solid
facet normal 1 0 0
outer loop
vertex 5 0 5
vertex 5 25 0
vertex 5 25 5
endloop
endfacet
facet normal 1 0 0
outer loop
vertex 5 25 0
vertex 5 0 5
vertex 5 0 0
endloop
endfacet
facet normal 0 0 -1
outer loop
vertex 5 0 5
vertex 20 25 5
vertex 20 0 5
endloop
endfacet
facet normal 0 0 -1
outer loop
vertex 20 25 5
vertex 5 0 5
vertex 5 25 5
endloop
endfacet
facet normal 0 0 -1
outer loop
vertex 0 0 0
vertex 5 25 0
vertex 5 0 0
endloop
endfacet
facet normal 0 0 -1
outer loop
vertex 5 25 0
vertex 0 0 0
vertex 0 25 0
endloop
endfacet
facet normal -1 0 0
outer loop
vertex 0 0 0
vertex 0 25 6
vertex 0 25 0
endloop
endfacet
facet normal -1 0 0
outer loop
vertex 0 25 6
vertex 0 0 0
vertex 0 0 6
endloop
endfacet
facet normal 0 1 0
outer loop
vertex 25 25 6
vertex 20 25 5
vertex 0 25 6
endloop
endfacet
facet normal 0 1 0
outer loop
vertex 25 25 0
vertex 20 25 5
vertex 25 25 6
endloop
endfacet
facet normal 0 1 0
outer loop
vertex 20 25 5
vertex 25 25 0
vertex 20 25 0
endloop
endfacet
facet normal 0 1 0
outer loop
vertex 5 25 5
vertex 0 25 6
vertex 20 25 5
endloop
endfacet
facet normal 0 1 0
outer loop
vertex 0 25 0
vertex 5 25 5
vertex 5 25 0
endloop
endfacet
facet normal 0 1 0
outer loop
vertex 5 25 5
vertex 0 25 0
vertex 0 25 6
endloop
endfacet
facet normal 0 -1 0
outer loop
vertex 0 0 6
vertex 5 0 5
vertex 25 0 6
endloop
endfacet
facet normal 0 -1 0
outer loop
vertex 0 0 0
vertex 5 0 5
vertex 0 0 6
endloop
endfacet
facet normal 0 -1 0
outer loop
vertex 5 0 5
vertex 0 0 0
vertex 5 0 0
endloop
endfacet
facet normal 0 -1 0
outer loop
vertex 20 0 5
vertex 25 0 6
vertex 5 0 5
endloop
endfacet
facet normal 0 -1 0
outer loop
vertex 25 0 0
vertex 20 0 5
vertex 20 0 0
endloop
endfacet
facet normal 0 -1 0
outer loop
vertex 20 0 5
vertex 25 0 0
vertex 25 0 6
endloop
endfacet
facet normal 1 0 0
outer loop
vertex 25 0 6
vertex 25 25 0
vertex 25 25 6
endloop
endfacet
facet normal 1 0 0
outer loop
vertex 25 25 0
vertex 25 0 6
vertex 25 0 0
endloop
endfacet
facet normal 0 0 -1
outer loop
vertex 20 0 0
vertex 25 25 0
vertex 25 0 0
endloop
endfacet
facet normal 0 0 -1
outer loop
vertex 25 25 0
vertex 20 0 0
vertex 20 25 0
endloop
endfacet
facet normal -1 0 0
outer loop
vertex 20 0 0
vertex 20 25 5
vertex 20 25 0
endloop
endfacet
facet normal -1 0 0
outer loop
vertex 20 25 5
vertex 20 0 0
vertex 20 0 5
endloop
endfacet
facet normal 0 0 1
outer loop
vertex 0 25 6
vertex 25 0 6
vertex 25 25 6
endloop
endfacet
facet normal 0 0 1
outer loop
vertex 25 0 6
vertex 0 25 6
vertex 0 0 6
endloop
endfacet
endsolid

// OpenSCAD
cube([5, 25, 5]);
translate([20, 0, 0])
	cube([5, 25, 5]);
translate([0, 0, 5])
	cube([25, 25, 1]);
